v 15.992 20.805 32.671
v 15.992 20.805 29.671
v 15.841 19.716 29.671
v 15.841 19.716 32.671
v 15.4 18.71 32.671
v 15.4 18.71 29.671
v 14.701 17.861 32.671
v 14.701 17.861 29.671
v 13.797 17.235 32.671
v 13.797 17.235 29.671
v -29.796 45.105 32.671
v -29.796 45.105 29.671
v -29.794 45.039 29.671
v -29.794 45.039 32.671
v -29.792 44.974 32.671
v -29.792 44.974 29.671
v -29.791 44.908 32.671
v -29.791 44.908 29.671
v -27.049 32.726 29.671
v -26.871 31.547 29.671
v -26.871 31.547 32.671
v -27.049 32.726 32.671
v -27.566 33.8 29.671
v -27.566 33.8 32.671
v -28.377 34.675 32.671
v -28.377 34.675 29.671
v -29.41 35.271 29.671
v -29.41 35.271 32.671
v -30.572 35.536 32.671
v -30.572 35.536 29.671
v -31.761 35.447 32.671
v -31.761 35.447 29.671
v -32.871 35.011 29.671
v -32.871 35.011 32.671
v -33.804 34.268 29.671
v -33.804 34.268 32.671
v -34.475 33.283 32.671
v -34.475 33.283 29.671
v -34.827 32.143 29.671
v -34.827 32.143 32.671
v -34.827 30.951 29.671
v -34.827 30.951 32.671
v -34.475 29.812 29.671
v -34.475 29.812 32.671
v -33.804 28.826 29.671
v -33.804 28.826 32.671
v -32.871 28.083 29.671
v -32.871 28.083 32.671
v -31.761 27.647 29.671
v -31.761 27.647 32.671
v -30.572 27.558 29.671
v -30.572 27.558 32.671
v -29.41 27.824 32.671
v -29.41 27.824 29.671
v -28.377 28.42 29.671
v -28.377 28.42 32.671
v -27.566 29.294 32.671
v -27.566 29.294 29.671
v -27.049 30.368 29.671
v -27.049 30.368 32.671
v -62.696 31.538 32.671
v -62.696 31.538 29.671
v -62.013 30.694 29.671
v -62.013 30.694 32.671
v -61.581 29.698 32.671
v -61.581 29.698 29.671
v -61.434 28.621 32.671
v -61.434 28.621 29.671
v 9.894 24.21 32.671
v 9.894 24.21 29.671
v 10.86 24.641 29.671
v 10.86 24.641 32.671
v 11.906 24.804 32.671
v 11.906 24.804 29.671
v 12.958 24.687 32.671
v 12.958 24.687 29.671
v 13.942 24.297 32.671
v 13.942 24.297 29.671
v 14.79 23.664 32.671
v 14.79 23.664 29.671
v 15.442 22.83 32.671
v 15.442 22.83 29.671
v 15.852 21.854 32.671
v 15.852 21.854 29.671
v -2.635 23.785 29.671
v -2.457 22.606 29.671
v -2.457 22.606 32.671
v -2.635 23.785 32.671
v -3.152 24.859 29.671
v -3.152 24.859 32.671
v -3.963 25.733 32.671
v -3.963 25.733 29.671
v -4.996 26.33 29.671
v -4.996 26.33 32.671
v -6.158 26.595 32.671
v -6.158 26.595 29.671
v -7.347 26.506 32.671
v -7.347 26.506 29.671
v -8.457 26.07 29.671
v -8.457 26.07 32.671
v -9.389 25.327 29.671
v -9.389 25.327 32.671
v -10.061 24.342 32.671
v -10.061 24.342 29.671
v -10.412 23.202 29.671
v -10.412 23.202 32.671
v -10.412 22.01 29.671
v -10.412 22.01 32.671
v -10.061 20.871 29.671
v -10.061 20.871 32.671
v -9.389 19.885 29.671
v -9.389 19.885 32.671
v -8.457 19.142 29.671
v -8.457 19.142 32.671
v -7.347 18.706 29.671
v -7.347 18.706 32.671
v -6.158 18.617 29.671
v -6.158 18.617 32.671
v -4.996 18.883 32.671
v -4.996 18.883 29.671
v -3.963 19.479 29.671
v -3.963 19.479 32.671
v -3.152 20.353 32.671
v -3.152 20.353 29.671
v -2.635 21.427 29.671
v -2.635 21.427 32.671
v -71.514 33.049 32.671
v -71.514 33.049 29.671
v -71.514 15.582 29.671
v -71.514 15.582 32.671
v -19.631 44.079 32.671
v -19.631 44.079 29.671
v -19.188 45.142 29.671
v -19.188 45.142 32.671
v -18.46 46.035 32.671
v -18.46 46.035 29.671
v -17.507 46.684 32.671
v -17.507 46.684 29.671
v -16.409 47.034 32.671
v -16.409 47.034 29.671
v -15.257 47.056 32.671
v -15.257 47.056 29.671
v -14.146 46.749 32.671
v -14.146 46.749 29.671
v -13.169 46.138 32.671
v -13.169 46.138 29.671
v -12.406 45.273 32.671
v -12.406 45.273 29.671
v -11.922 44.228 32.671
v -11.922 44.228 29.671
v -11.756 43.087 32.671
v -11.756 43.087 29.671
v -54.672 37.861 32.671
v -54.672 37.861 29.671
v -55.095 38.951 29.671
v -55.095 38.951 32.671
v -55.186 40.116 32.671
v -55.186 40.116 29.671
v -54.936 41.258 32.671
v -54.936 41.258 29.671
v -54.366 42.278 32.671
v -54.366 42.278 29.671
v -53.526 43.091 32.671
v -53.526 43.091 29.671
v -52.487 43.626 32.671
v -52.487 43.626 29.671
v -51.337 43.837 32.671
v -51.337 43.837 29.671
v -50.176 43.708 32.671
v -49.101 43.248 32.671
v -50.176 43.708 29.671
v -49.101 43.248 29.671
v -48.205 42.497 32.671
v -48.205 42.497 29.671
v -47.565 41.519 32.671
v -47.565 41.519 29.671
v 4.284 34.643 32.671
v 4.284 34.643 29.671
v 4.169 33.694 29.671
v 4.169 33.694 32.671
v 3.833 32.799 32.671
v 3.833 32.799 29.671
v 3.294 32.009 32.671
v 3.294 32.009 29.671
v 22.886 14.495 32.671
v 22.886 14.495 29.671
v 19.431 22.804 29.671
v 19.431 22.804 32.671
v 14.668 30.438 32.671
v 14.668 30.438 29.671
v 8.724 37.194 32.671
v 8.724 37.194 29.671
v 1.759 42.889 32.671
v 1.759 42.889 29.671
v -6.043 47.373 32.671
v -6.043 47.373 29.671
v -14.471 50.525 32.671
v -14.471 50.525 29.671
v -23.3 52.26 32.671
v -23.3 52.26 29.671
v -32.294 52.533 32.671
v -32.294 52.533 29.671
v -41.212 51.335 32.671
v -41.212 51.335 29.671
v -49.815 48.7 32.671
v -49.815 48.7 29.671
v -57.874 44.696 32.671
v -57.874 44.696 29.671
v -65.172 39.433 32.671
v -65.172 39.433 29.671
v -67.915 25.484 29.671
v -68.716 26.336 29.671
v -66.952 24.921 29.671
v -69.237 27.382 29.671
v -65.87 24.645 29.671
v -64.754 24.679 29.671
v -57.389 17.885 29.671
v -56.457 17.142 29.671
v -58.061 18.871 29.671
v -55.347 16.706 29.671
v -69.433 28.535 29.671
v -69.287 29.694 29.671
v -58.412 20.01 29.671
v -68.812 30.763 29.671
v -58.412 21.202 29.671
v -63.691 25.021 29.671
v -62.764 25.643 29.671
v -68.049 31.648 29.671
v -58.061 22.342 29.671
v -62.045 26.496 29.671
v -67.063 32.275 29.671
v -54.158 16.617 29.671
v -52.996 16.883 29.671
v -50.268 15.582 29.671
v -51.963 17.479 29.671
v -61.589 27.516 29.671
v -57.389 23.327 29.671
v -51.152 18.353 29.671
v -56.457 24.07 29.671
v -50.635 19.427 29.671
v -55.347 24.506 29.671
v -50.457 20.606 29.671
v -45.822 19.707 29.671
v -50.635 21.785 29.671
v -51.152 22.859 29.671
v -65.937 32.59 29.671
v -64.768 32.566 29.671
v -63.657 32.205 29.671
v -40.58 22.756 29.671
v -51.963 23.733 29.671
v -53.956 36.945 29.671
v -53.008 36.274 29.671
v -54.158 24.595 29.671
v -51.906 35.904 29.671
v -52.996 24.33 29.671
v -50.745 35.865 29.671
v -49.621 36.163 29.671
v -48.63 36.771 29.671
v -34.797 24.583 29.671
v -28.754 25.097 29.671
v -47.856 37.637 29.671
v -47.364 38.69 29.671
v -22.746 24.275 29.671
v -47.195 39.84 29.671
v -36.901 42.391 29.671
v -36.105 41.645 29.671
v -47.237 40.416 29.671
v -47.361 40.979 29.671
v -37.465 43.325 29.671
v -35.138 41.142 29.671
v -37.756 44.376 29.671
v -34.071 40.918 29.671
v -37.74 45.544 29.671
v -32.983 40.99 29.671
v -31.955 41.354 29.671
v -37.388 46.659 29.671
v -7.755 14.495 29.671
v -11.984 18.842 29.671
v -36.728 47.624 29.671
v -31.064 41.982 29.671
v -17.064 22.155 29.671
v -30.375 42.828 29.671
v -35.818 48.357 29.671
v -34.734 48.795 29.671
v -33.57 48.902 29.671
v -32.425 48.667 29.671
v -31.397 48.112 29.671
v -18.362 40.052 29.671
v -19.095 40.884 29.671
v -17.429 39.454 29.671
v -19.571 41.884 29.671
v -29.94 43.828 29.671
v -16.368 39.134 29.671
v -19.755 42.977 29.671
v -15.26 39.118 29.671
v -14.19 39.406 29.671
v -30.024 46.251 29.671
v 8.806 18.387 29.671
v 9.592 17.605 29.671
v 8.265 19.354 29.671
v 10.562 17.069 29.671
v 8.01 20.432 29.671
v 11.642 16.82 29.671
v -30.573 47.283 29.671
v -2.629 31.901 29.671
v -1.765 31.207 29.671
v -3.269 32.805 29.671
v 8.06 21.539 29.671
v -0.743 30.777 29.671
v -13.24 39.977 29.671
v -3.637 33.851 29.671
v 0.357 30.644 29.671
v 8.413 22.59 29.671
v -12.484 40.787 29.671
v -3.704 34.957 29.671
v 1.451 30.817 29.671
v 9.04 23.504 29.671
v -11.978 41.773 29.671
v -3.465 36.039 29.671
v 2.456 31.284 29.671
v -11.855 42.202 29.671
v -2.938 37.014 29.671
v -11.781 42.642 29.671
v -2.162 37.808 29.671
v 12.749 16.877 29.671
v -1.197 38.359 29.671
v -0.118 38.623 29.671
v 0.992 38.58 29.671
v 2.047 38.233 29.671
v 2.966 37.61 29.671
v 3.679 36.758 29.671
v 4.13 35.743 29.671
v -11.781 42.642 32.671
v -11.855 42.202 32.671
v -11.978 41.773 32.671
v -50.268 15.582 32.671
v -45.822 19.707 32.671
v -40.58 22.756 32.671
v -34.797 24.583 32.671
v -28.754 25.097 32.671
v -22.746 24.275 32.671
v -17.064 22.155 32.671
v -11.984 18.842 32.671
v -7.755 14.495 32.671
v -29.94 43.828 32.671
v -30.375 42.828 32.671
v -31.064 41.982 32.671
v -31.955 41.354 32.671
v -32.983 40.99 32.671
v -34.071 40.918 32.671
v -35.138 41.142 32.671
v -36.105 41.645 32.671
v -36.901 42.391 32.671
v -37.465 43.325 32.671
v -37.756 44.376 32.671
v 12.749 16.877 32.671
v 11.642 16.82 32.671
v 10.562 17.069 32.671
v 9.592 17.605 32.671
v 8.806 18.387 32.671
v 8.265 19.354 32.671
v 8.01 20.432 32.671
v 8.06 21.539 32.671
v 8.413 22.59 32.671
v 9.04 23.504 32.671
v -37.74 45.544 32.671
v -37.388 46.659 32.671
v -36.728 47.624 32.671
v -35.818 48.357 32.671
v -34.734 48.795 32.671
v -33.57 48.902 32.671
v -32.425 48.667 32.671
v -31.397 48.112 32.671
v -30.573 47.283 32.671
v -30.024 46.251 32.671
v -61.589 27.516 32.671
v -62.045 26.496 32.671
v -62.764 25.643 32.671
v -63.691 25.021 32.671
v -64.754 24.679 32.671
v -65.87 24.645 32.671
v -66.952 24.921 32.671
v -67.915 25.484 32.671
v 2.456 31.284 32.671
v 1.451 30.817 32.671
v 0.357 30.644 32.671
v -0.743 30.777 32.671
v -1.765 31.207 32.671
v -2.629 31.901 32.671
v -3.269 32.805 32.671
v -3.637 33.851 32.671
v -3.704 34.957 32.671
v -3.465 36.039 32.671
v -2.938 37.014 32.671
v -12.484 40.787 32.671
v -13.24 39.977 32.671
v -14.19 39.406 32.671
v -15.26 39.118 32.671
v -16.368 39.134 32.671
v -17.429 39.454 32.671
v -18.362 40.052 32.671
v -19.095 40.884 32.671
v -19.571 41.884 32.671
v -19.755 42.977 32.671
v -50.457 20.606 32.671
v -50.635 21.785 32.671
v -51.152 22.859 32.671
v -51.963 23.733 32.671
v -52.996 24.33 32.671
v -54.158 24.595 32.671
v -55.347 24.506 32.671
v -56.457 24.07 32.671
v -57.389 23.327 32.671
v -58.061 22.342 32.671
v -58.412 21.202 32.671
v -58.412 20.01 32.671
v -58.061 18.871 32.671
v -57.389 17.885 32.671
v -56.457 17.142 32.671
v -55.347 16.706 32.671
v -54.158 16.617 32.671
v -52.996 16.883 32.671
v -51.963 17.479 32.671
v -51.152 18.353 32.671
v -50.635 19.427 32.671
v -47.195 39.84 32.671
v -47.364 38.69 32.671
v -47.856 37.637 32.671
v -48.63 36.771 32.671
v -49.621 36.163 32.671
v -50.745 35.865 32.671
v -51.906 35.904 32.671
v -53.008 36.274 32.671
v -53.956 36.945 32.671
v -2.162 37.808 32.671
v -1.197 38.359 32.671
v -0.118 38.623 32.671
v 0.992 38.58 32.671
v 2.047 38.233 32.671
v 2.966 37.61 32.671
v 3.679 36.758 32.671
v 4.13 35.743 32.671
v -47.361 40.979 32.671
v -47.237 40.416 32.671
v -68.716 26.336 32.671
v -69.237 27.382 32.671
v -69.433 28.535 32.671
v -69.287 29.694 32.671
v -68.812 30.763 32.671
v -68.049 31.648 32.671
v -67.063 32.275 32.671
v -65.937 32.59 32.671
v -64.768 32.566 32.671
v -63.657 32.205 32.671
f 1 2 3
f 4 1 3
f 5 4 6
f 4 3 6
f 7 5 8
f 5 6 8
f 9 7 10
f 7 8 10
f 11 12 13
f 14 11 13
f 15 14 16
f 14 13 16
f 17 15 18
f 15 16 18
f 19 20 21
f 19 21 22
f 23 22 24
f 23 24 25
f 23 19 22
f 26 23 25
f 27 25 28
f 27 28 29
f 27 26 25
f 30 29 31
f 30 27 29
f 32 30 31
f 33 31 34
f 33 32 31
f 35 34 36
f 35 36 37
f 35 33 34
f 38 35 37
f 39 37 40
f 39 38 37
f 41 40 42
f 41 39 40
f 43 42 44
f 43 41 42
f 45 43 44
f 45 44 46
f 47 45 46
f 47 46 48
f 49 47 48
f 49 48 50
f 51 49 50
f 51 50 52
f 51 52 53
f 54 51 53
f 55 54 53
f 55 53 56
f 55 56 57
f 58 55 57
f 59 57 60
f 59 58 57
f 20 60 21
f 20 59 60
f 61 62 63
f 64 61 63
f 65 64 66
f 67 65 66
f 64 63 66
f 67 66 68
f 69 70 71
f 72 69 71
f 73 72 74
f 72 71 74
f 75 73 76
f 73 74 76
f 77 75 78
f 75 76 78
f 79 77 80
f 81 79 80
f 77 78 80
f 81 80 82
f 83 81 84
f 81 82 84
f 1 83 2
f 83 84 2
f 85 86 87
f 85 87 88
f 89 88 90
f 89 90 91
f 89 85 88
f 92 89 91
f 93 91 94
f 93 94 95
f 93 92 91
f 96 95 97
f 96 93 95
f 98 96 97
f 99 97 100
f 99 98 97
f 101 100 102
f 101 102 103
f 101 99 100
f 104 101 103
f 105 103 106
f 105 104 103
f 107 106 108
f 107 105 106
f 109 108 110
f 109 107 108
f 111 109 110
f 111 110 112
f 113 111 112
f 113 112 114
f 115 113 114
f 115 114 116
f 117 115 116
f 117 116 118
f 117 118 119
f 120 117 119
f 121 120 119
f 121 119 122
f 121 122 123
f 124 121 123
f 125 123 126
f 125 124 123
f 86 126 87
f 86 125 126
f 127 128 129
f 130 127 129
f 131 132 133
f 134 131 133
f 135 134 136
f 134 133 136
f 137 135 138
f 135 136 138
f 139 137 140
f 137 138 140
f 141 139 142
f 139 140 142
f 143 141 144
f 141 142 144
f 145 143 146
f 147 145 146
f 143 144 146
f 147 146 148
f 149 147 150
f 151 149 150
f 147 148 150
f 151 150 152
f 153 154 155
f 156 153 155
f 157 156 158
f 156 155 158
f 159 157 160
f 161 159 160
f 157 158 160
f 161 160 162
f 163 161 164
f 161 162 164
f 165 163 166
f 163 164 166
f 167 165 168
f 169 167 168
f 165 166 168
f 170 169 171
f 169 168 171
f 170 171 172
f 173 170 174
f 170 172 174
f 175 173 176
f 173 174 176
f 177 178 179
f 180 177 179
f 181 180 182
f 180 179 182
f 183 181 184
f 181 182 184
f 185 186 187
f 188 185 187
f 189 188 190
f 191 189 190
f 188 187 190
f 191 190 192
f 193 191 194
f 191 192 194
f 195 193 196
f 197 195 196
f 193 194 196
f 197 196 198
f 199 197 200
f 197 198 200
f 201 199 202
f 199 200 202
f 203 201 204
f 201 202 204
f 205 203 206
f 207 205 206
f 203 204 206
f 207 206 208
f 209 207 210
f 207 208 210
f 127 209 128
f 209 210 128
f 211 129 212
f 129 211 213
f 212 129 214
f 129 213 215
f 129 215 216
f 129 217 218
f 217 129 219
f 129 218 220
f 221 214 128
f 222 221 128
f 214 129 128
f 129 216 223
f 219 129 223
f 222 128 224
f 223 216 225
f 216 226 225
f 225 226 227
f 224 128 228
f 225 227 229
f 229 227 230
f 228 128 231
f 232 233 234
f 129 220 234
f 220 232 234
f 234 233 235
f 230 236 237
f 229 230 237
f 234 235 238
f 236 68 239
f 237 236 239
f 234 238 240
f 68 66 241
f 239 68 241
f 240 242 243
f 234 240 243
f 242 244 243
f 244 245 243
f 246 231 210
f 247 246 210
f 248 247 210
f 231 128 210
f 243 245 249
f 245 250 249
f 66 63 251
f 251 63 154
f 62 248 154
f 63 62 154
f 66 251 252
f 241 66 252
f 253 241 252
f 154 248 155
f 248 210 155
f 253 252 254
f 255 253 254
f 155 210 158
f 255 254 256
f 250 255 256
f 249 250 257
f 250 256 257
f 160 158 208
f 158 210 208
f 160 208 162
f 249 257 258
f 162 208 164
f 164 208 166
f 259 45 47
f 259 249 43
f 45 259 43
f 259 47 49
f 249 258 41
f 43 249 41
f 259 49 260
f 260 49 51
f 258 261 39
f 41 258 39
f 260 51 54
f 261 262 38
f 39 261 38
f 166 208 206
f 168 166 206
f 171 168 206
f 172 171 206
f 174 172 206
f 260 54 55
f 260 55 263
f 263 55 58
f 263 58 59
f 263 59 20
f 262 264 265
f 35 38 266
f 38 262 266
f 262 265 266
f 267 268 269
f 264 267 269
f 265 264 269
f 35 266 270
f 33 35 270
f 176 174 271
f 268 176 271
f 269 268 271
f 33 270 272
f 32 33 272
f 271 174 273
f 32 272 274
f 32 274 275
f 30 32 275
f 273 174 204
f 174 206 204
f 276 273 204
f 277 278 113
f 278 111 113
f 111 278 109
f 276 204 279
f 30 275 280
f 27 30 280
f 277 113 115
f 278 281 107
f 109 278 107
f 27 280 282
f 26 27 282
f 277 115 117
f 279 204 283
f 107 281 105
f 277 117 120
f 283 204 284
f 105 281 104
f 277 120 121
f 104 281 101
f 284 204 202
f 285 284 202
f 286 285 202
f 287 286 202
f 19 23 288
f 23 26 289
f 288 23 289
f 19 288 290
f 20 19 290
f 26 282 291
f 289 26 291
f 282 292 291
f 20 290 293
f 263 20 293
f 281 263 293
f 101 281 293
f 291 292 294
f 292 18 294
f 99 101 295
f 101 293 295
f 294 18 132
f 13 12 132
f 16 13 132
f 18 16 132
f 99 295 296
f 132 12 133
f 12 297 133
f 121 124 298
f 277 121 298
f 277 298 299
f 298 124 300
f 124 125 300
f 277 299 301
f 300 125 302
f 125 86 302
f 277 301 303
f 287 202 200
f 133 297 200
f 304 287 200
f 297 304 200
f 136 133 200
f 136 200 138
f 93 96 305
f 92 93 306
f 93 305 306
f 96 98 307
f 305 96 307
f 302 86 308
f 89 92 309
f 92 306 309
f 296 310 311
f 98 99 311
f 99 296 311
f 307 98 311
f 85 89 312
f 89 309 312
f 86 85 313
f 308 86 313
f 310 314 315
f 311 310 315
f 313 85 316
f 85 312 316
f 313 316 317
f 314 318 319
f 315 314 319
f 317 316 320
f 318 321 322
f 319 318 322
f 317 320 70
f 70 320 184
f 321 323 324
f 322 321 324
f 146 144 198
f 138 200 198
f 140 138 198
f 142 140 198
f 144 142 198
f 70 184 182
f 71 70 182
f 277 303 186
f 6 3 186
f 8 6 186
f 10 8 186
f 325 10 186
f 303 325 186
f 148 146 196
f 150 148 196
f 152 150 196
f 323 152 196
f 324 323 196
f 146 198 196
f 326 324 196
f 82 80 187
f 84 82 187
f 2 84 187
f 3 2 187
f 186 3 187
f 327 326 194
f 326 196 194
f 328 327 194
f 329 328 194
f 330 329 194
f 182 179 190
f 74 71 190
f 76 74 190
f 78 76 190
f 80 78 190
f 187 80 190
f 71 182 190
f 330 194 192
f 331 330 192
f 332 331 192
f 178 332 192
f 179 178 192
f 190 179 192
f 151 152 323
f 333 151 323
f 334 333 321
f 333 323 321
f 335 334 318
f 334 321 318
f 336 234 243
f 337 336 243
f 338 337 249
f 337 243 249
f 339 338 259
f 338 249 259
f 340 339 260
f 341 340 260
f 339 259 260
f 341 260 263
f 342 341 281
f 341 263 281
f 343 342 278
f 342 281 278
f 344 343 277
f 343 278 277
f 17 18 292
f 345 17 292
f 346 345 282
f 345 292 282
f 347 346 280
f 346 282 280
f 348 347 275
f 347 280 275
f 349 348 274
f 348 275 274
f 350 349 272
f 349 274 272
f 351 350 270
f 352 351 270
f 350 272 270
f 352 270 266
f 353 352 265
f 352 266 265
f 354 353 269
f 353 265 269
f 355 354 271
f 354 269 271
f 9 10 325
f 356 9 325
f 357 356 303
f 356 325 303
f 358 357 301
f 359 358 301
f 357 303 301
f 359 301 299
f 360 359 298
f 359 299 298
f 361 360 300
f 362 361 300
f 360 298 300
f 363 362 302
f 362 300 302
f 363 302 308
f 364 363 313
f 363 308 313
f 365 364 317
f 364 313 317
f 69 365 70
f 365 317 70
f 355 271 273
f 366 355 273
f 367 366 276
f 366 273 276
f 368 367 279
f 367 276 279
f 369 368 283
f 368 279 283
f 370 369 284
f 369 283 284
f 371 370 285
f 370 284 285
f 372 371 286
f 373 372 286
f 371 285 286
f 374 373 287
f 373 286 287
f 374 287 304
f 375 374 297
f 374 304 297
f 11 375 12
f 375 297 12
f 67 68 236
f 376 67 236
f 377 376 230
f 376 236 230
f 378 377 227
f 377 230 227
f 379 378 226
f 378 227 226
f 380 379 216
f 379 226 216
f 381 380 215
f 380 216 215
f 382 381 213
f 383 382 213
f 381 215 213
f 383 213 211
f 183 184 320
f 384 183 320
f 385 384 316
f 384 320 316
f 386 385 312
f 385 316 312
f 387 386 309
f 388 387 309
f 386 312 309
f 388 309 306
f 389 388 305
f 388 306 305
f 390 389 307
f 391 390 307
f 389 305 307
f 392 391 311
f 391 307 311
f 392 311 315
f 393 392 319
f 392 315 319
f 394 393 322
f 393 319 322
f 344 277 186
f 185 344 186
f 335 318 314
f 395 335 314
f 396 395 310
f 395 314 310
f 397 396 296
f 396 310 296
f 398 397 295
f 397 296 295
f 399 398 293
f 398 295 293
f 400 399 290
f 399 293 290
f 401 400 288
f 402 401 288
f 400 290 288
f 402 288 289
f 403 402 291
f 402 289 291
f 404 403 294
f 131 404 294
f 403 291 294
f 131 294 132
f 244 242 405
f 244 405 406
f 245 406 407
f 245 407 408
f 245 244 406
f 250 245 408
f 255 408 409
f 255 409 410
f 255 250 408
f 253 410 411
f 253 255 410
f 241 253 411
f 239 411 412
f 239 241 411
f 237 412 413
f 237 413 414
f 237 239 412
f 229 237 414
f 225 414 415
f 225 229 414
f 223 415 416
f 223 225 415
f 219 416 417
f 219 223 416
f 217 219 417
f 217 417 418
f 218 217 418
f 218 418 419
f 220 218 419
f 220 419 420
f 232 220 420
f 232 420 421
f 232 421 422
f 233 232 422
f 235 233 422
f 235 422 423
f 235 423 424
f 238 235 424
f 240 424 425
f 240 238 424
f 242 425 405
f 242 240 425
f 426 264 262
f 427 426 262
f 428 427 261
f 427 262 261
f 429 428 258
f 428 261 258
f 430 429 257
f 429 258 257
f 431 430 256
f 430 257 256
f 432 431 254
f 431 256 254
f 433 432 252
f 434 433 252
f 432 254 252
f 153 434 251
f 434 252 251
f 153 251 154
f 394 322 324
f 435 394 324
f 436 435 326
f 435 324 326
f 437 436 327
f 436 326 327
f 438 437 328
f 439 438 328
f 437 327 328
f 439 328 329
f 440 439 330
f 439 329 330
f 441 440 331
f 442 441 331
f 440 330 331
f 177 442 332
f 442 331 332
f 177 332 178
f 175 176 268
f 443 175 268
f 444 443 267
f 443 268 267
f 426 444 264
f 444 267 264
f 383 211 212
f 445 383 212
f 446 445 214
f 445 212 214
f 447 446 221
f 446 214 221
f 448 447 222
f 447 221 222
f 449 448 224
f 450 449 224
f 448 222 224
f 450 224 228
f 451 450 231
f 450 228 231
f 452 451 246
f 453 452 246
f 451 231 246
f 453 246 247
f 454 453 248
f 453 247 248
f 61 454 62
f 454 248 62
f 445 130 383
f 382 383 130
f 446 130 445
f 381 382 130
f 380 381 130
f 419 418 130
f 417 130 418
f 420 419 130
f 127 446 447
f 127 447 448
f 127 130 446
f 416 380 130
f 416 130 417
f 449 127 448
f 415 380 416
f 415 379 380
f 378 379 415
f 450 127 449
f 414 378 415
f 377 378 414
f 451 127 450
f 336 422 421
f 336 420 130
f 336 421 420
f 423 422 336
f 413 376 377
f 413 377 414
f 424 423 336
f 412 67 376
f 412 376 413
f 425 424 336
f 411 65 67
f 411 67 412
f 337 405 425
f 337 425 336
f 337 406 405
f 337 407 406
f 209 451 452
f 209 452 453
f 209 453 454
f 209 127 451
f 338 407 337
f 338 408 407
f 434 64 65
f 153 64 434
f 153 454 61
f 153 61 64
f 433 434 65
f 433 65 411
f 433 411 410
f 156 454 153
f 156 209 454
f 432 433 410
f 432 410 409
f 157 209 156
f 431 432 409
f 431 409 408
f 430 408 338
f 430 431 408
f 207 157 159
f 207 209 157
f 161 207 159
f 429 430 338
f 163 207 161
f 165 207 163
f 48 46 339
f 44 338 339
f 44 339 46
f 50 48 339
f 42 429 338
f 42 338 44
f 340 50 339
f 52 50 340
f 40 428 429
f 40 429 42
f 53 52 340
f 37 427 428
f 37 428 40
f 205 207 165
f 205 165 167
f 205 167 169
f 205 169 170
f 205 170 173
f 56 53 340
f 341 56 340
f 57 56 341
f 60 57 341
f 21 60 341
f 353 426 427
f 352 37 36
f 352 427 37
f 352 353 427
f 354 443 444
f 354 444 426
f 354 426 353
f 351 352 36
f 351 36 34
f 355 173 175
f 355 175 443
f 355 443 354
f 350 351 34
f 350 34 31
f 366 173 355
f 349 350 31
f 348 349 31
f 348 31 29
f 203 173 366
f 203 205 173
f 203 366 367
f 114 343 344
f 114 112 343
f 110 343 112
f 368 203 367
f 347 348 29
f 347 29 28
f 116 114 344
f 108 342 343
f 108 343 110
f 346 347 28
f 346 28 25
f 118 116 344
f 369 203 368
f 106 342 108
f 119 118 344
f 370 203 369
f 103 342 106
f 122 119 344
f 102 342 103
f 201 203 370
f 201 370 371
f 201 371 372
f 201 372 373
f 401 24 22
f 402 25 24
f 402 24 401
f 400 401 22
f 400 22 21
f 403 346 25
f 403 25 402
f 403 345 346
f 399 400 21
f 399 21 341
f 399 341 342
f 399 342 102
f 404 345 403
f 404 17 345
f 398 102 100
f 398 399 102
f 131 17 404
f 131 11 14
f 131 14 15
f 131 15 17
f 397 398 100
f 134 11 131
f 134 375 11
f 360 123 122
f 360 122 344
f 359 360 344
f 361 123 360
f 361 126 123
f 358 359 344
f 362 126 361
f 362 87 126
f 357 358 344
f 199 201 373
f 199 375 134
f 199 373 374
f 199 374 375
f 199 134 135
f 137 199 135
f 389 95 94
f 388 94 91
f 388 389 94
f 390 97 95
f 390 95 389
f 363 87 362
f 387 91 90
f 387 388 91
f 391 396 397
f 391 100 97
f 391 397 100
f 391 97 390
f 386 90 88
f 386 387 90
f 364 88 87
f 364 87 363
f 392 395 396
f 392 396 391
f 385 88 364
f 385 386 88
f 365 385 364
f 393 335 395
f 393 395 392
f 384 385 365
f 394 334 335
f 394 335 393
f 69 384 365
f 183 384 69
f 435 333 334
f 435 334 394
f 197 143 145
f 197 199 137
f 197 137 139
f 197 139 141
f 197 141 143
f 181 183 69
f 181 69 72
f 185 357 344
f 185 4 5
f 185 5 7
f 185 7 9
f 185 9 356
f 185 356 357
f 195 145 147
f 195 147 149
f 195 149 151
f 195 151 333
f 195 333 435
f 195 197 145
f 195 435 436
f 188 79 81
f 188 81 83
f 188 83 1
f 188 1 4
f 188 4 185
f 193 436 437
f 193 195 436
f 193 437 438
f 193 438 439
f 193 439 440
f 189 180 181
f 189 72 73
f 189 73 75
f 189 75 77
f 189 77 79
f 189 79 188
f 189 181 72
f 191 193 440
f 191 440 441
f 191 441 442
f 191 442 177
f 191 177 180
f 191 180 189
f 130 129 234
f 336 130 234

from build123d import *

# Parameters (mm, degrees)
SKETCH2_R           = 4
BOSS_EXTRUDE1_DEPTH = 3


with BuildPart() as part:
    # Sketch2 → Boss-Extrude1 (new body)
    # profile 1 of 3: a face of its own
    with BuildSketch(Plane.XY.offset(29.670544835)):
        with BuildLine():
            ThreePointArc((6.802372388, 14.495325214), (-28.853343247, 37.601496731), (-65.190306526, 15.582179772))
            Line((-65.190306526, 15.582179772), (-50.268412727, 15.582179772))
            ThreePointArc((-50.268412727, 15.582179772), (-28.754344017, 25.097072211), (-7.754551371, 14.495325214))
            Line((-7.754551371, 14.495325214), (6.802372388, 14.495325214))
        make_face()
        with Locations((-54.457143935, 20.606054181)):
            Circle(SKETCH2_R, mode=Mode.SUBTRACT)
        with Locations((-30.871357497, 31.547179678)):
            Circle(SKETCH2_R, mode=Mode.SUBTRACT)
        with Locations((-6.457143935, 22.606054181)):
            Circle(SKETCH2_R, mode=Mode.SUBTRACT)
    # profile 2 of 3: a face of its own
    with BuildSketch(Plane.XY.offset(29.670544835)):
        with BuildLine():
            ThreePointArc((-67.915477314, 25.484479418), (-69.818945991, 22.649515101), (-71.513826382, 19.685127113))
            Line((-71.513826382, 19.685127113), (-71.513826382, 15.582179772))
            Line((-71.513826382, 15.582179772), (-65.190306526, 15.582179772))
            ThreePointArc((-65.190306526, 15.582179772), (-28.853343247, 37.601496731), (6.802372388, 14.495325214))
            Line((6.802372388, 14.495325214), (14.938830252, 14.495325214))
            ThreePointArc((14.938830252, 14.495325214), (14.389447504, 15.874234692), (13.797248858, 17.235305417))
            ThreePointArc((13.797248858, 17.235305417), (8.501873451, 18.851359524), (9.893531234, 24.21008327))
            ThreePointArc((9.893531234, 24.21008327), (6.804255556, 28.287659534), (3.294383766, 32.009359739))
            ThreePointArc((3.294383766, 32.009359739), (-2.22078734, 31.524056472), (-2.93787796, 37.013902793))
            ThreePointArc((-2.93787796, 37.013902793), (-7.329691445, 39.637302632), (-11.978161336, 41.773181859))
            ThreePointArc((-11.978161336, 41.773181859), (-16.909941136, 39.257197046), (-19.63134861, 44.078667044))
            ThreePointArc((-19.63134861, 44.078667044), (-24.686110043, 44.86583873), (-29.796210715, 45.104843995))
            ThreePointArc((-29.796210715, 45.104843995), (-29.792572401, 45.00640165), (-29.791359384, 44.907899562))
            ThreePointArc((-29.791359384, 44.907899562), (-33.524574673, 40.916806239), (-37.755772343, 44.375518221))
            ThreePointArc((-37.755772343, 44.375518221), (-42.737345236, 43.211824139), (-47.564881022, 41.519148556))
            ThreePointArc((-47.564881022, 41.519148556), (-47.288818763, 40.699632679), (-47.195341682, 39.839935825))
            ThreePointArc((-47.195341682, 39.839935825), (-50.171922049, 35.97307505), (-54.67164781, 37.861225208))
            ThreePointArc((-54.67164781, 37.861225208), (-58.85455429, 34.916136792), (-62.696480095, 31.538288585))
            ThreePointArc((-62.696480095, 31.538288585), (-61.762829246, 30.210656667), (-61.433540443, 28.621355152))
            ThreePointArc((-61.433540443, 28.621355152), (-63.691092092, 25.020817172), (-67.915477314, 25.484479418))
        make_face()
    # profile 3 of 3: a face of its own
    with BuildSketch(Plane.XY.offset(29.670544835)):
        with BuildLine():
            ThreePointArc((22.885501432, 14.495325214), (-18.849868318, 51.573504594), (-71.513826382, 33.049466285))
            Line((-71.513826382, 33.049466285), (-71.513826382, 19.685127113))
            ThreePointArc((-71.513826382, 19.685127113), (-69.818945991, 22.649515101), (-67.915477314, 25.484479418))
            ThreePointArc((-67.915477314, 25.484479418), (-68.463131728, 31.233169971), (-62.696480095, 31.538288585))
            ThreePointArc((-62.696480095, 31.538288585), (-58.85455429, 34.916136792), (-54.67164781, 37.861225208))
            ThreePointArc((-54.67164781, 37.861225208), (-53.025926756, 43.396473227), (-47.564881022, 41.519148556))
            ThreePointArc((-47.564881022, 41.519148556), (-42.737345236, 43.211824139), (-37.755772343, 44.375518221))
            ThreePointArc((-37.755772343, 44.375518221), (-34.156345949, 48.891212858), (-29.796210715, 45.104843995))
            ThreePointArc((-29.796210715, 45.104843995), (-24.686110043, 44.86583873), (-19.63134861, 44.078667044))
            ThreePointArc((-19.63134861, 44.078667044), (-15.256521979, 47.055857815), (-11.756175362, 43.087187195))
            ThreePointArc((-11.756175362, 43.087187195), (-11.812062273, 42.420874994), (-11.978161336, 41.773181859))
            ThreePointArc((-11.978161336, 41.773181859), (-7.329691445, 39.637302632), (-2.93787796, 37.013902793))
            ThreePointArc((-2.93787796, 37.013902793), (1.531436617, 38.443369839), (4.283705221, 34.642953235))
            ThreePointArc((4.283705221, 34.642953235), (4.028215481, 33.23631081), (3.294383766, 32.009359739))
            ThreePointArc((3.294383766, 32.009359739), (6.804255556, 28.287659534), (9.893531234, 24.21008327))
            ThreePointArc((9.893531234, 24.21008327), (13.942318539, 24.297464692), (15.992357809, 20.804950819))
            ThreePointArc((15.992357809, 20.804950819), (15.399670841, 18.709666137), (13.797248858, 17.235305417))
            ThreePointArc((13.797248858, 17.235305417), (14.389447504, 15.874234692), (14.938830252, 14.495325214))
            Line((14.938830252, 14.495325214), (22.885501432, 14.495325214))
        make_face()
    extrude(amount=BOSS_EXTRUDE1_DEPTH)


solid = part.part
